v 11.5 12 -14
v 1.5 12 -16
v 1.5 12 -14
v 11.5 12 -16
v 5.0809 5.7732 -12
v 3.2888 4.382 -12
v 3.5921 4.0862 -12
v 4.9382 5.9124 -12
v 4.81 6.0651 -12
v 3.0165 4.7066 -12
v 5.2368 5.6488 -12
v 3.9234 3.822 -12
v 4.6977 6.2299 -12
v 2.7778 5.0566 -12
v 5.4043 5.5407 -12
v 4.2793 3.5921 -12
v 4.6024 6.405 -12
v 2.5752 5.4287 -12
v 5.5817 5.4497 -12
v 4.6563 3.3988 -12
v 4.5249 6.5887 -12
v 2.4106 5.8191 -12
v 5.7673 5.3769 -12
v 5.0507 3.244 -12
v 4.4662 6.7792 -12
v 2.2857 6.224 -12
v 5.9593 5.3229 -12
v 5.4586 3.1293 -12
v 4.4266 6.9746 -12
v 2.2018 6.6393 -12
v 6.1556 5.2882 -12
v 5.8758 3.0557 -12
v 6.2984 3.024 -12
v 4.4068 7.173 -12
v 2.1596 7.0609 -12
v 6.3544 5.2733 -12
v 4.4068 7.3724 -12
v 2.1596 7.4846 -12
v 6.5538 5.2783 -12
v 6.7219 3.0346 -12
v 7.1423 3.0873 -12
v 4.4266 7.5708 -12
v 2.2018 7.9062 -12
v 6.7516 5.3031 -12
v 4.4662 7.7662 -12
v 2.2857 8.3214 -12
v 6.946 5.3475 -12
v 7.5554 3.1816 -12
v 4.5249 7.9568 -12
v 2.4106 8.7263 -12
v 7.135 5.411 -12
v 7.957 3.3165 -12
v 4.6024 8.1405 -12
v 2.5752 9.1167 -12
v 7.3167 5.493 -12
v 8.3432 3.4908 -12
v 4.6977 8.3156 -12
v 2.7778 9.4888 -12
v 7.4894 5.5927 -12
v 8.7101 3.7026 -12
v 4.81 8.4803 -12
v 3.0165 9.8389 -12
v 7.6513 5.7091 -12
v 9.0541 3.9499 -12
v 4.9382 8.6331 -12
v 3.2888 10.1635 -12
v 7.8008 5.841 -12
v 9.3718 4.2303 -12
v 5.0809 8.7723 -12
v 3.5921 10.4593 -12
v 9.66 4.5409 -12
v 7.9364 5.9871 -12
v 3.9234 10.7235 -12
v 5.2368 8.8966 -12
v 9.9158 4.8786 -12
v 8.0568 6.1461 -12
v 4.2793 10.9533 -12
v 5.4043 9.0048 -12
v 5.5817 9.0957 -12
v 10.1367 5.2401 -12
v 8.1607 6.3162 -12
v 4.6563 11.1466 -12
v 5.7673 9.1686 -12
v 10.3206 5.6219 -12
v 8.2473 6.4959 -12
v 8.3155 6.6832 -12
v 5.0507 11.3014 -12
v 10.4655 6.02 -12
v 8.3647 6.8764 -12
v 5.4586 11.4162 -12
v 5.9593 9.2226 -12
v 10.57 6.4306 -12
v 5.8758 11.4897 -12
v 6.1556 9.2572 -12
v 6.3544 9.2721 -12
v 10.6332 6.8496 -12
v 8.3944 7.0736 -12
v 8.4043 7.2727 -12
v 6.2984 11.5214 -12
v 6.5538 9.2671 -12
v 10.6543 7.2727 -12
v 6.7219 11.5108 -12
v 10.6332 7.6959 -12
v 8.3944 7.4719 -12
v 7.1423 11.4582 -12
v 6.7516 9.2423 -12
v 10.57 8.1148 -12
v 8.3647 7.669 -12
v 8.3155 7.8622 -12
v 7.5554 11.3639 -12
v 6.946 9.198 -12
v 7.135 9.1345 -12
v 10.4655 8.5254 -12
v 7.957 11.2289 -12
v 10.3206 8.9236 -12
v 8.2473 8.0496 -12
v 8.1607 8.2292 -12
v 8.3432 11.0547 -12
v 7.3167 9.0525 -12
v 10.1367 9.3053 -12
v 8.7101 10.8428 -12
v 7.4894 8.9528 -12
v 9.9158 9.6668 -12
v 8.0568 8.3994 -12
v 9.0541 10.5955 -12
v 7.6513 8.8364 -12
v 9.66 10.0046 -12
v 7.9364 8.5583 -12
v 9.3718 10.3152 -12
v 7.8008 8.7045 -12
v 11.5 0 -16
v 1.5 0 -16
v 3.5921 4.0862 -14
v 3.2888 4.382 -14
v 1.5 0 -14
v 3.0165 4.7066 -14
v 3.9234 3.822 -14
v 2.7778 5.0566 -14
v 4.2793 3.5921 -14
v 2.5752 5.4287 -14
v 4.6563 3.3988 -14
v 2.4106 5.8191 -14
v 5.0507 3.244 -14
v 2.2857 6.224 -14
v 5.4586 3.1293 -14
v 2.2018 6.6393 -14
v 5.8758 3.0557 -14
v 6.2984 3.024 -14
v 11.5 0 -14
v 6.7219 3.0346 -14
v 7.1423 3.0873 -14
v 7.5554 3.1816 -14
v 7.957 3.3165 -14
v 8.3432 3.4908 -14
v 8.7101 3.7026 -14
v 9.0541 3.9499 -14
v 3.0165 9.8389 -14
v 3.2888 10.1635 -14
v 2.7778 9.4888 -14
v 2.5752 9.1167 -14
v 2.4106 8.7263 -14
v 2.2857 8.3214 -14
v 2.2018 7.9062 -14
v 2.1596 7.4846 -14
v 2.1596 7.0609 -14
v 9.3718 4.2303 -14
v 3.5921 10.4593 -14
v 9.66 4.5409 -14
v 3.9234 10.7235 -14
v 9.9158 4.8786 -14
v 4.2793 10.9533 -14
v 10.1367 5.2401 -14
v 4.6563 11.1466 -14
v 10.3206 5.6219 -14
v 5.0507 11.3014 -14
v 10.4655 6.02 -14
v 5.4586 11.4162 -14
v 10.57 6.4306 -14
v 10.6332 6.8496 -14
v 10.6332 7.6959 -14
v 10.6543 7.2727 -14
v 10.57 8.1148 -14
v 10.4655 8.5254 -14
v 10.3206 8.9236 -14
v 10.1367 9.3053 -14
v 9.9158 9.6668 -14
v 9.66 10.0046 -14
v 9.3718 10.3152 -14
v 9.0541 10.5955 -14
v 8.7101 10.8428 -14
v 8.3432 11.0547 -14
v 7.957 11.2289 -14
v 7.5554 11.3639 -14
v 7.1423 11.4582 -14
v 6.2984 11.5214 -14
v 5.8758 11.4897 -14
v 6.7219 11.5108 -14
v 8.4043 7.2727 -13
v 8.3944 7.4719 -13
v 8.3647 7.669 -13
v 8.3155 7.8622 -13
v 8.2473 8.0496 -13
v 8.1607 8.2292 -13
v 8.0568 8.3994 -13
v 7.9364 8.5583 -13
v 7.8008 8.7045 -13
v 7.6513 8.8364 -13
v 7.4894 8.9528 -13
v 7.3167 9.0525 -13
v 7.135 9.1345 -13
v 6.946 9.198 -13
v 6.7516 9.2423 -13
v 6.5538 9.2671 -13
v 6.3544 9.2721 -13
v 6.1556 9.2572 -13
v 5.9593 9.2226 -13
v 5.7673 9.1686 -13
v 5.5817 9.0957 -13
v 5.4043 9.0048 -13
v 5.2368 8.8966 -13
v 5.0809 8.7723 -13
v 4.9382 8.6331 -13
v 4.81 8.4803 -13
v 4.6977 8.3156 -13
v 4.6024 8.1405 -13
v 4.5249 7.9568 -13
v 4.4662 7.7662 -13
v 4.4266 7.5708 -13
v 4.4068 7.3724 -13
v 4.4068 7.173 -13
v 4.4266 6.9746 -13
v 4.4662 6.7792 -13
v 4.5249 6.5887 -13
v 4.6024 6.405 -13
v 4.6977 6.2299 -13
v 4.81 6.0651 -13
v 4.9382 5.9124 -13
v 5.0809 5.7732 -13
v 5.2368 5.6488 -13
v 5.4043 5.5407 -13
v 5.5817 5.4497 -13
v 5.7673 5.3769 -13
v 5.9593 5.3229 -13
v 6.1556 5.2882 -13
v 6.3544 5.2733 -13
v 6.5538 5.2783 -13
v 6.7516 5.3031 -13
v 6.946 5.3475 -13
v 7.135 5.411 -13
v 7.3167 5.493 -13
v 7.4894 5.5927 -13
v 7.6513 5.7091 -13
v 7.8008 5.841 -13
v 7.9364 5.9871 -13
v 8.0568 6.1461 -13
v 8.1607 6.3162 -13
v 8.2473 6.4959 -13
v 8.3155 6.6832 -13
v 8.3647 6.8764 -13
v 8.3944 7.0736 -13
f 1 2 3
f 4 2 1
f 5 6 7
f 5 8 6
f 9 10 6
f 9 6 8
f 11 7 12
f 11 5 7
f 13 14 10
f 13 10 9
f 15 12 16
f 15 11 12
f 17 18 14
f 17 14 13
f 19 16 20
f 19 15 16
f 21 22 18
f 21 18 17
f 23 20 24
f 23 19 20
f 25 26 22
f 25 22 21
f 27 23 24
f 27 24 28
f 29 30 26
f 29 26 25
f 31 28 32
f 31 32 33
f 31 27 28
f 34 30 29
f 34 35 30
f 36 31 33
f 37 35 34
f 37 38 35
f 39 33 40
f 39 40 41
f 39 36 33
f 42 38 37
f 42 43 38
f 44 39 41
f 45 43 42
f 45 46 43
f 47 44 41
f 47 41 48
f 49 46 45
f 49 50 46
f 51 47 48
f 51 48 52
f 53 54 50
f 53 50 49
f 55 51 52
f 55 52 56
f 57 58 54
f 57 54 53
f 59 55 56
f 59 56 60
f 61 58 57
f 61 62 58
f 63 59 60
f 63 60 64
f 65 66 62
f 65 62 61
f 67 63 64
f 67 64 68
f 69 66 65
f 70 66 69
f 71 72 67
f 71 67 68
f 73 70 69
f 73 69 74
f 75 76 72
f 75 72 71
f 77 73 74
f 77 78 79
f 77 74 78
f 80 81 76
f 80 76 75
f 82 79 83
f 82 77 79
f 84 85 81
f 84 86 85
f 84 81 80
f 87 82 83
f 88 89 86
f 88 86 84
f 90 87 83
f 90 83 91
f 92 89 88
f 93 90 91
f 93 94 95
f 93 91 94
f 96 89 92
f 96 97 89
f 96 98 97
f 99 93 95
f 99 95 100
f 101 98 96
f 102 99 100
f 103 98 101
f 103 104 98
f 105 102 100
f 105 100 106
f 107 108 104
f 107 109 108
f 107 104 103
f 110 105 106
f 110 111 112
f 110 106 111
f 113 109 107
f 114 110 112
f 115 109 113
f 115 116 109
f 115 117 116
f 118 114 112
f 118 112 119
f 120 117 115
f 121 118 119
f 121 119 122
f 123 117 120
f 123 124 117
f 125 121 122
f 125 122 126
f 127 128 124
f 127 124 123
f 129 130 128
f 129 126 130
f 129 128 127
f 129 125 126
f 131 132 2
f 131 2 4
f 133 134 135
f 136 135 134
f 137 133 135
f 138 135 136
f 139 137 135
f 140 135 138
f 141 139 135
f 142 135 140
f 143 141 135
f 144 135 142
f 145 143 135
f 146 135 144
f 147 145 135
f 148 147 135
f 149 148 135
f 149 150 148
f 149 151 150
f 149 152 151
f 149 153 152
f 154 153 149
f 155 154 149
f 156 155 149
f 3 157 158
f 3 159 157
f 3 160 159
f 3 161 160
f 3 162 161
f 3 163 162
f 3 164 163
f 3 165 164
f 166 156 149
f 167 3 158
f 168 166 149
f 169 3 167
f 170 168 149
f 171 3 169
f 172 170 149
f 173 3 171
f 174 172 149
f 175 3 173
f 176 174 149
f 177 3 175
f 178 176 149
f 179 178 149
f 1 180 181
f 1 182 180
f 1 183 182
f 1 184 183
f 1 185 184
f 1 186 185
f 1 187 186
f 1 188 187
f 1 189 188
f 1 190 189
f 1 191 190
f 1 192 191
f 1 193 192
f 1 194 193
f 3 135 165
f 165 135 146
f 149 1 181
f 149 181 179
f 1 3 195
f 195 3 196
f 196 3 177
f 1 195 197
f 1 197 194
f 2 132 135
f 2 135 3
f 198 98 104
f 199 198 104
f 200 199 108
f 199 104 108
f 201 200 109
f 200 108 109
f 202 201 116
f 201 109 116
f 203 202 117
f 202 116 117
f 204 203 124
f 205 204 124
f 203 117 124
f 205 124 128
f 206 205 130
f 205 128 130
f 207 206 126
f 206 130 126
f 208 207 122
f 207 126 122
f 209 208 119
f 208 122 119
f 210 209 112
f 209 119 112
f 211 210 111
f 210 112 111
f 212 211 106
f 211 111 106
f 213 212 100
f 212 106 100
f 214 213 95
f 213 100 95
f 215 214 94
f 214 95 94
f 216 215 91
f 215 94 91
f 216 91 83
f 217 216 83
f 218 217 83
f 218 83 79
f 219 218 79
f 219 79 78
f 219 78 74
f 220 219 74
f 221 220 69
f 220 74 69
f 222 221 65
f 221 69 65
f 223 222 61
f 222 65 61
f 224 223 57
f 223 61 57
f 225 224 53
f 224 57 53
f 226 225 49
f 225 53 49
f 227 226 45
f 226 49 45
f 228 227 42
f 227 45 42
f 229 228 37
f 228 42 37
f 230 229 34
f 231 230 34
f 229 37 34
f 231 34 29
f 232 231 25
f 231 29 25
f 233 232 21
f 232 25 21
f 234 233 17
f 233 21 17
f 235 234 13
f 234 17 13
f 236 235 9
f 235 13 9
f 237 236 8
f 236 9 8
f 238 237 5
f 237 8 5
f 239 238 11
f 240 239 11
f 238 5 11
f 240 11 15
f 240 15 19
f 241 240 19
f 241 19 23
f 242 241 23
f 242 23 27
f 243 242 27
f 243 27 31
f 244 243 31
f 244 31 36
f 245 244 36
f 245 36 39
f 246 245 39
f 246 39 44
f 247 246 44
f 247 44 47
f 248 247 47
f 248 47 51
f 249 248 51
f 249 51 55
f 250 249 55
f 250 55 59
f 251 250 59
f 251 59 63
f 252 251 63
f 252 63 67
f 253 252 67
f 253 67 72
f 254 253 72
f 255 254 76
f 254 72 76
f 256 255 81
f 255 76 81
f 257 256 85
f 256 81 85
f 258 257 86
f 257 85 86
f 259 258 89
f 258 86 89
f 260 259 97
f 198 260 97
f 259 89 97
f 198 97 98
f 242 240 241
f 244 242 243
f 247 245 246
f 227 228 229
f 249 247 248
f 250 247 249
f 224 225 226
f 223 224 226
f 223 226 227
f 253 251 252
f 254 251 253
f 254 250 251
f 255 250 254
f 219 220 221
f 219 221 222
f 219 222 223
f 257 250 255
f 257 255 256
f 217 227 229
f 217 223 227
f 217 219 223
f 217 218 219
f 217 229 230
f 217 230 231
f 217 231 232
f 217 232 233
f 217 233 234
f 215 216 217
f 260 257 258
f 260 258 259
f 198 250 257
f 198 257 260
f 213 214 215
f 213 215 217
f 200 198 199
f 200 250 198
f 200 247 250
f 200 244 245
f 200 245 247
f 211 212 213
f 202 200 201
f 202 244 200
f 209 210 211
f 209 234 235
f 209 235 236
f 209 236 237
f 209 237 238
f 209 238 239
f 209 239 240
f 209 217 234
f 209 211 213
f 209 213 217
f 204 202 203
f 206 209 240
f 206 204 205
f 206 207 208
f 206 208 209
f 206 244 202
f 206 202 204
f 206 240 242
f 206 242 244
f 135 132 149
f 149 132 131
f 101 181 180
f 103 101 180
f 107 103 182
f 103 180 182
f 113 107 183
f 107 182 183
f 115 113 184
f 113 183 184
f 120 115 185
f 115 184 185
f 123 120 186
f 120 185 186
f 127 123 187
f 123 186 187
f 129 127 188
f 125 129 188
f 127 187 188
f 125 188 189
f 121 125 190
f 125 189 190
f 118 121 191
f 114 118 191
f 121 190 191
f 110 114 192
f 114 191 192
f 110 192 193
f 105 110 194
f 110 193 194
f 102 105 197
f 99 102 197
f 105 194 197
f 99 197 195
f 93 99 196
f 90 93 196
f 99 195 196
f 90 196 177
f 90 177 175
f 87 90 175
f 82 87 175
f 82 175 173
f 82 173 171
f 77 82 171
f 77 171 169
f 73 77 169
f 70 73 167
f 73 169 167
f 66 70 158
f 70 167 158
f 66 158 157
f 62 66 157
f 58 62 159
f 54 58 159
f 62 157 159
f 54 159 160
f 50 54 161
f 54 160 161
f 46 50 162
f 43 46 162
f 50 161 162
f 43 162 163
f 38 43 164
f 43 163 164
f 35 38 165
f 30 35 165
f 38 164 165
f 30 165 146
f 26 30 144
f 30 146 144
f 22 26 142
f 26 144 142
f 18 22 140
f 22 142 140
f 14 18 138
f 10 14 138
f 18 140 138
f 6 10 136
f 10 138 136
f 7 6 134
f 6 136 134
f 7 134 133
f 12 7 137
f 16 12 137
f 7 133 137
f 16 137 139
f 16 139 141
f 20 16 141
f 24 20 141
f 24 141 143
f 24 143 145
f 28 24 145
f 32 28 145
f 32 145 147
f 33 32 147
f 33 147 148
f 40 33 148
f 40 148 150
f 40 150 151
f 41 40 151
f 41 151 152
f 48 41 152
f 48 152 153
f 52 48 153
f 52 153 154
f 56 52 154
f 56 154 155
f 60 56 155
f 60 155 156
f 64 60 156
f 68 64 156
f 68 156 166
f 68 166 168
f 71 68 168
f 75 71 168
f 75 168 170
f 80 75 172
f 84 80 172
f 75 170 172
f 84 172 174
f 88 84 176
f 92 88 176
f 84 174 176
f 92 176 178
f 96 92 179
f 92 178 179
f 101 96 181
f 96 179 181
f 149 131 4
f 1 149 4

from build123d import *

# Parameters (mm, degrees)
BOX_W        = 10
BOX_H        = 12
BOX_DEPTH    = 2
SKETCH_R     = 4.25
PAD_DEPTH    = 2
SKETCH001_R  = 2
POCKET_DEPTH = 1


with BuildPart() as part:
    # Box → Box (new body)
    with BuildSketch(Plane.XY):
        with Locations((5, 6)):
            Rectangle(BOX_W, BOX_H)
    extrude(amount=BOX_DEPTH)

    # Sketch → Pad (new body)
    with BuildSketch(Plane.XY.offset(2)):
        with Locations((4.904306, 7.272724)):
            Circle(SKETCH_R)
    extrude(amount=PAD_DEPTH)

    # Sketch001 → Pocket (cut)
    with BuildSketch(Plane.XY.offset(4)):
        with Locations((4.904306, 7.272724)):
            Circle(SKETCH001_R)
    extrude(amount=-POCKET_DEPTH, mode=Mode.SUBTRACT)


with BuildPart() as part_1:
    # Clone placement: moved
    add(part.part.moved(Location((1.5, 0, -16))))


solid = part_1.part
